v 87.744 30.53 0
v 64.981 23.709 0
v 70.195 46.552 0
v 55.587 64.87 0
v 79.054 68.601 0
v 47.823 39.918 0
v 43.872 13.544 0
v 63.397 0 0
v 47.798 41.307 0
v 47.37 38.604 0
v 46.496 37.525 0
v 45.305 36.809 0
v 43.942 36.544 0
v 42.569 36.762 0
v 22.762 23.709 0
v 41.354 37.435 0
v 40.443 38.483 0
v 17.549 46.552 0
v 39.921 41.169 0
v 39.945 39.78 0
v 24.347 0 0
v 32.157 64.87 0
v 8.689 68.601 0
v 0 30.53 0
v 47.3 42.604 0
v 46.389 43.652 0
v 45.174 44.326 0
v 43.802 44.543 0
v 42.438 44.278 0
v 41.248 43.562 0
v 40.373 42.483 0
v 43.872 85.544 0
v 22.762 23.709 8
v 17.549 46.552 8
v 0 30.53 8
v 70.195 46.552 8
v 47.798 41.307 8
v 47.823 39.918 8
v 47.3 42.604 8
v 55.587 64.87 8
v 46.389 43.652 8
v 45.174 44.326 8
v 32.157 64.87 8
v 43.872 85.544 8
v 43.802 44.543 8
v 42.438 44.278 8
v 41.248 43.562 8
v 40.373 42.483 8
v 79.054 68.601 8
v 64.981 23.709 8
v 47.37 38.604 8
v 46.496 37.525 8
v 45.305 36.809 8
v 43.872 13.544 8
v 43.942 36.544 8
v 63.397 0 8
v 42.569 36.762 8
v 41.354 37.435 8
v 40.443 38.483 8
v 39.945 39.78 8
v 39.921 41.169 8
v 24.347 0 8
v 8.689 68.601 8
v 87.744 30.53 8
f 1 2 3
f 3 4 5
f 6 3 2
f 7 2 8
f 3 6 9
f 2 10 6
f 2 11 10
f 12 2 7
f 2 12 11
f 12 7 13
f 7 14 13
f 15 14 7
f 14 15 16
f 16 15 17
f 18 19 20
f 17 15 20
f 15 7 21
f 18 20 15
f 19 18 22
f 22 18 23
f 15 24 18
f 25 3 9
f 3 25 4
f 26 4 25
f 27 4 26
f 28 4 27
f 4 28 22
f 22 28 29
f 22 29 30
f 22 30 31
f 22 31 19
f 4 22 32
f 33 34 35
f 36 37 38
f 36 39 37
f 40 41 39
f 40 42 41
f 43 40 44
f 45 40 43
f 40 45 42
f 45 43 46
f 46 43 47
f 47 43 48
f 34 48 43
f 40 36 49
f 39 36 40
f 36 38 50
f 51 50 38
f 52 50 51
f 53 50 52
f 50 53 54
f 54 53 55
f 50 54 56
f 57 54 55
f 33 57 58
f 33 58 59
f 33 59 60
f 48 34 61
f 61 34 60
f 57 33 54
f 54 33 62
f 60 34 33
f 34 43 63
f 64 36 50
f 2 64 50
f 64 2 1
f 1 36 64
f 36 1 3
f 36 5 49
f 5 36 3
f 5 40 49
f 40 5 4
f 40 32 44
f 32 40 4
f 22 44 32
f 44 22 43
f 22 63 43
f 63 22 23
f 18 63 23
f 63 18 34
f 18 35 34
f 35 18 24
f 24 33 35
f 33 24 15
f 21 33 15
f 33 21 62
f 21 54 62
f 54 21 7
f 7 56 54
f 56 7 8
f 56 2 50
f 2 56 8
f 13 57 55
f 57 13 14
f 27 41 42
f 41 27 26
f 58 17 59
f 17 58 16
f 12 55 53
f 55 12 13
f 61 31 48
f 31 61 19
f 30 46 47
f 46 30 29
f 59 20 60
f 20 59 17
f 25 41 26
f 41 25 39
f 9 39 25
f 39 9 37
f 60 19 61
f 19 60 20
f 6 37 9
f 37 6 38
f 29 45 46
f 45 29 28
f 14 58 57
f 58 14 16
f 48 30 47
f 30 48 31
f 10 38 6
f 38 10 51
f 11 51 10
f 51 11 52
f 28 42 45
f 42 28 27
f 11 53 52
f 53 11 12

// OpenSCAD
$fn = 32;

// ----------------------------------------------------------------------
// Star wheel: 7-point blunt, R45
// ----------------------------------------------------------------------

// --- parameters (mm) ---
n_points = 7;             // number of points / teeth
r_out = 45;               // tip radius
r_in = 27;                // root radius
bore_r = 4;               // centre bore radius
plate_t = 8;              // plate thickness, Z (extrusion height)
bore_d = 8;               // centre bore diameter

profile = [[43.872, 85.544], [32.157, 64.87], [8.689, 68.601], [17.549, 46.552], [0, 30.53], [22.762, 23.709], [24.347, 0], [43.872, 13.544], [63.397, 0], [64.981, 23.709], [87.744, 30.53], [70.195, 46.552], [79.054, 68.601], [55.587, 64.87]];  // primary outline, 14 points, counter clockwise
void_1 = [[47.798, 41.307], [47.3, 42.604], [46.389, 43.652], [45.174, 44.326], [43.802, 44.543], [42.438, 44.278], [41.248, 43.562], [40.373, 42.483], [39.921, 41.169], [39.945, 39.78], [40.443, 38.483], [41.354, 37.435], [42.569, 36.762], [43.942, 36.544], [45.305, 36.809], [46.496, 37.525], [47.37, 38.604], [47.823, 39.918]];  // centre bore, 18 points

// --- the one profile operation ---
difference() {
  linear_extrude(height = plate_t) polygon(points = profile);
  translate([0, 0, -1])
    linear_extrude(height = plate_t + 2) polygon(points = void_1);
}
